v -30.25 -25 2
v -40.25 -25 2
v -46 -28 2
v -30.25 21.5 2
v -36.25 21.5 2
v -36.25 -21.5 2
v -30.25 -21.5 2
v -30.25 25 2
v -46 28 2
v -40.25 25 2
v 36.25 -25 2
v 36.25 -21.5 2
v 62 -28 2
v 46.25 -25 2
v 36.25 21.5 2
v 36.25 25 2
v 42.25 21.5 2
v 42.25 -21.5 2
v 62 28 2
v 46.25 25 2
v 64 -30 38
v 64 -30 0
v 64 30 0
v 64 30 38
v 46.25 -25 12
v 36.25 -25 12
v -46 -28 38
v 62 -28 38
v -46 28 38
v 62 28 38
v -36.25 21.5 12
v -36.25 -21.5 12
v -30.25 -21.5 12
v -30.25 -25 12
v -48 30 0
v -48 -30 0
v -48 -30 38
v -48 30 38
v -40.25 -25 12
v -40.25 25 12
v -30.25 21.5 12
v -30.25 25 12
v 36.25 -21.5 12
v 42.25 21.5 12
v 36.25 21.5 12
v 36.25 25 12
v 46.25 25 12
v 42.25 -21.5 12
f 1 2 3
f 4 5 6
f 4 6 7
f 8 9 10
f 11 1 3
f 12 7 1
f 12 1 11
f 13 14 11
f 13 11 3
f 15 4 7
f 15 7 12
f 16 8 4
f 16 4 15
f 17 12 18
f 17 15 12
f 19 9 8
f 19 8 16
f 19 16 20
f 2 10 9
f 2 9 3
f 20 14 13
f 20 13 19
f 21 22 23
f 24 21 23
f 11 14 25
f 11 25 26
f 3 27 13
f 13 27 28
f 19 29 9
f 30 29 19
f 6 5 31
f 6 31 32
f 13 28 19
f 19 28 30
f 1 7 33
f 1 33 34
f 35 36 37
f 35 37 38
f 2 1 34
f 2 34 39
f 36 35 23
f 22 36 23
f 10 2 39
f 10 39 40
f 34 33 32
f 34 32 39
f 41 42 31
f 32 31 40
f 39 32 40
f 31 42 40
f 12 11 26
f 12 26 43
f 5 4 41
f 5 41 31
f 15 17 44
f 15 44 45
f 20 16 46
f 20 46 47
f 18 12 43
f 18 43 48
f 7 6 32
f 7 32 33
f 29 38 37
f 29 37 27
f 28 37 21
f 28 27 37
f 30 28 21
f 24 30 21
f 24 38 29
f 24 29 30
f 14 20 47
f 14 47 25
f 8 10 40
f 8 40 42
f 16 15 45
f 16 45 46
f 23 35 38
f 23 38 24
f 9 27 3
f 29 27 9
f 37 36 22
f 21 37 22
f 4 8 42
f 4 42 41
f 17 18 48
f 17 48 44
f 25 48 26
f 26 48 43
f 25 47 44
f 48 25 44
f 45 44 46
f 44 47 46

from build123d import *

# Parameters (mm, degrees)
SKETCH004_W     = 112
SKETCH004_H     = 60
PAD004_DEPTH    = 38
SKETCH006_W     = 108
SKETCH006_H     = 56
POCKET002_DEPTH = 36
PAD005_DEPTH    = 10


with BuildPart() as part:
    # Sketch004 → Pad004 (new body)
    with BuildSketch(Plane.XY):
        with Locations((8, 0)):
            Rectangle(SKETCH004_W, SKETCH004_H)
    extrude(amount=PAD004_DEPTH)

    # Sketch006 (on Face6 of Pad004) → Pocket002 (cut)
    with BuildSketch(Plane.XY.offset(38)):
        with Locations((8, 0)):
            Rectangle(SKETCH006_W, SKETCH006_H)
    extrude(amount=-POCKET002_DEPTH, mode=Mode.SUBTRACT)

    # Sketch007 (on Face11 of Pocket002) → Pad005 (join)
    with BuildSketch(Plane.XY.offset(2)):
        Polygon((-36.25, 21.5), (-36.25, -21.5), (-30.25, -21.5), (-30.25, -25), (-40.25, -25), (-40.25, 25), (-30.25, 25), (-30.25, 21.5), align=None)
        Polygon((42.25, -21.5), (42.25, 21.5), (36.25, 21.5), (36.25, 25), (46.25, 25), (46.25, -25), (36.25, -25), (36.25, -21.5), align=None)
    extrude(amount=PAD005_DEPTH)


solid = part.part
